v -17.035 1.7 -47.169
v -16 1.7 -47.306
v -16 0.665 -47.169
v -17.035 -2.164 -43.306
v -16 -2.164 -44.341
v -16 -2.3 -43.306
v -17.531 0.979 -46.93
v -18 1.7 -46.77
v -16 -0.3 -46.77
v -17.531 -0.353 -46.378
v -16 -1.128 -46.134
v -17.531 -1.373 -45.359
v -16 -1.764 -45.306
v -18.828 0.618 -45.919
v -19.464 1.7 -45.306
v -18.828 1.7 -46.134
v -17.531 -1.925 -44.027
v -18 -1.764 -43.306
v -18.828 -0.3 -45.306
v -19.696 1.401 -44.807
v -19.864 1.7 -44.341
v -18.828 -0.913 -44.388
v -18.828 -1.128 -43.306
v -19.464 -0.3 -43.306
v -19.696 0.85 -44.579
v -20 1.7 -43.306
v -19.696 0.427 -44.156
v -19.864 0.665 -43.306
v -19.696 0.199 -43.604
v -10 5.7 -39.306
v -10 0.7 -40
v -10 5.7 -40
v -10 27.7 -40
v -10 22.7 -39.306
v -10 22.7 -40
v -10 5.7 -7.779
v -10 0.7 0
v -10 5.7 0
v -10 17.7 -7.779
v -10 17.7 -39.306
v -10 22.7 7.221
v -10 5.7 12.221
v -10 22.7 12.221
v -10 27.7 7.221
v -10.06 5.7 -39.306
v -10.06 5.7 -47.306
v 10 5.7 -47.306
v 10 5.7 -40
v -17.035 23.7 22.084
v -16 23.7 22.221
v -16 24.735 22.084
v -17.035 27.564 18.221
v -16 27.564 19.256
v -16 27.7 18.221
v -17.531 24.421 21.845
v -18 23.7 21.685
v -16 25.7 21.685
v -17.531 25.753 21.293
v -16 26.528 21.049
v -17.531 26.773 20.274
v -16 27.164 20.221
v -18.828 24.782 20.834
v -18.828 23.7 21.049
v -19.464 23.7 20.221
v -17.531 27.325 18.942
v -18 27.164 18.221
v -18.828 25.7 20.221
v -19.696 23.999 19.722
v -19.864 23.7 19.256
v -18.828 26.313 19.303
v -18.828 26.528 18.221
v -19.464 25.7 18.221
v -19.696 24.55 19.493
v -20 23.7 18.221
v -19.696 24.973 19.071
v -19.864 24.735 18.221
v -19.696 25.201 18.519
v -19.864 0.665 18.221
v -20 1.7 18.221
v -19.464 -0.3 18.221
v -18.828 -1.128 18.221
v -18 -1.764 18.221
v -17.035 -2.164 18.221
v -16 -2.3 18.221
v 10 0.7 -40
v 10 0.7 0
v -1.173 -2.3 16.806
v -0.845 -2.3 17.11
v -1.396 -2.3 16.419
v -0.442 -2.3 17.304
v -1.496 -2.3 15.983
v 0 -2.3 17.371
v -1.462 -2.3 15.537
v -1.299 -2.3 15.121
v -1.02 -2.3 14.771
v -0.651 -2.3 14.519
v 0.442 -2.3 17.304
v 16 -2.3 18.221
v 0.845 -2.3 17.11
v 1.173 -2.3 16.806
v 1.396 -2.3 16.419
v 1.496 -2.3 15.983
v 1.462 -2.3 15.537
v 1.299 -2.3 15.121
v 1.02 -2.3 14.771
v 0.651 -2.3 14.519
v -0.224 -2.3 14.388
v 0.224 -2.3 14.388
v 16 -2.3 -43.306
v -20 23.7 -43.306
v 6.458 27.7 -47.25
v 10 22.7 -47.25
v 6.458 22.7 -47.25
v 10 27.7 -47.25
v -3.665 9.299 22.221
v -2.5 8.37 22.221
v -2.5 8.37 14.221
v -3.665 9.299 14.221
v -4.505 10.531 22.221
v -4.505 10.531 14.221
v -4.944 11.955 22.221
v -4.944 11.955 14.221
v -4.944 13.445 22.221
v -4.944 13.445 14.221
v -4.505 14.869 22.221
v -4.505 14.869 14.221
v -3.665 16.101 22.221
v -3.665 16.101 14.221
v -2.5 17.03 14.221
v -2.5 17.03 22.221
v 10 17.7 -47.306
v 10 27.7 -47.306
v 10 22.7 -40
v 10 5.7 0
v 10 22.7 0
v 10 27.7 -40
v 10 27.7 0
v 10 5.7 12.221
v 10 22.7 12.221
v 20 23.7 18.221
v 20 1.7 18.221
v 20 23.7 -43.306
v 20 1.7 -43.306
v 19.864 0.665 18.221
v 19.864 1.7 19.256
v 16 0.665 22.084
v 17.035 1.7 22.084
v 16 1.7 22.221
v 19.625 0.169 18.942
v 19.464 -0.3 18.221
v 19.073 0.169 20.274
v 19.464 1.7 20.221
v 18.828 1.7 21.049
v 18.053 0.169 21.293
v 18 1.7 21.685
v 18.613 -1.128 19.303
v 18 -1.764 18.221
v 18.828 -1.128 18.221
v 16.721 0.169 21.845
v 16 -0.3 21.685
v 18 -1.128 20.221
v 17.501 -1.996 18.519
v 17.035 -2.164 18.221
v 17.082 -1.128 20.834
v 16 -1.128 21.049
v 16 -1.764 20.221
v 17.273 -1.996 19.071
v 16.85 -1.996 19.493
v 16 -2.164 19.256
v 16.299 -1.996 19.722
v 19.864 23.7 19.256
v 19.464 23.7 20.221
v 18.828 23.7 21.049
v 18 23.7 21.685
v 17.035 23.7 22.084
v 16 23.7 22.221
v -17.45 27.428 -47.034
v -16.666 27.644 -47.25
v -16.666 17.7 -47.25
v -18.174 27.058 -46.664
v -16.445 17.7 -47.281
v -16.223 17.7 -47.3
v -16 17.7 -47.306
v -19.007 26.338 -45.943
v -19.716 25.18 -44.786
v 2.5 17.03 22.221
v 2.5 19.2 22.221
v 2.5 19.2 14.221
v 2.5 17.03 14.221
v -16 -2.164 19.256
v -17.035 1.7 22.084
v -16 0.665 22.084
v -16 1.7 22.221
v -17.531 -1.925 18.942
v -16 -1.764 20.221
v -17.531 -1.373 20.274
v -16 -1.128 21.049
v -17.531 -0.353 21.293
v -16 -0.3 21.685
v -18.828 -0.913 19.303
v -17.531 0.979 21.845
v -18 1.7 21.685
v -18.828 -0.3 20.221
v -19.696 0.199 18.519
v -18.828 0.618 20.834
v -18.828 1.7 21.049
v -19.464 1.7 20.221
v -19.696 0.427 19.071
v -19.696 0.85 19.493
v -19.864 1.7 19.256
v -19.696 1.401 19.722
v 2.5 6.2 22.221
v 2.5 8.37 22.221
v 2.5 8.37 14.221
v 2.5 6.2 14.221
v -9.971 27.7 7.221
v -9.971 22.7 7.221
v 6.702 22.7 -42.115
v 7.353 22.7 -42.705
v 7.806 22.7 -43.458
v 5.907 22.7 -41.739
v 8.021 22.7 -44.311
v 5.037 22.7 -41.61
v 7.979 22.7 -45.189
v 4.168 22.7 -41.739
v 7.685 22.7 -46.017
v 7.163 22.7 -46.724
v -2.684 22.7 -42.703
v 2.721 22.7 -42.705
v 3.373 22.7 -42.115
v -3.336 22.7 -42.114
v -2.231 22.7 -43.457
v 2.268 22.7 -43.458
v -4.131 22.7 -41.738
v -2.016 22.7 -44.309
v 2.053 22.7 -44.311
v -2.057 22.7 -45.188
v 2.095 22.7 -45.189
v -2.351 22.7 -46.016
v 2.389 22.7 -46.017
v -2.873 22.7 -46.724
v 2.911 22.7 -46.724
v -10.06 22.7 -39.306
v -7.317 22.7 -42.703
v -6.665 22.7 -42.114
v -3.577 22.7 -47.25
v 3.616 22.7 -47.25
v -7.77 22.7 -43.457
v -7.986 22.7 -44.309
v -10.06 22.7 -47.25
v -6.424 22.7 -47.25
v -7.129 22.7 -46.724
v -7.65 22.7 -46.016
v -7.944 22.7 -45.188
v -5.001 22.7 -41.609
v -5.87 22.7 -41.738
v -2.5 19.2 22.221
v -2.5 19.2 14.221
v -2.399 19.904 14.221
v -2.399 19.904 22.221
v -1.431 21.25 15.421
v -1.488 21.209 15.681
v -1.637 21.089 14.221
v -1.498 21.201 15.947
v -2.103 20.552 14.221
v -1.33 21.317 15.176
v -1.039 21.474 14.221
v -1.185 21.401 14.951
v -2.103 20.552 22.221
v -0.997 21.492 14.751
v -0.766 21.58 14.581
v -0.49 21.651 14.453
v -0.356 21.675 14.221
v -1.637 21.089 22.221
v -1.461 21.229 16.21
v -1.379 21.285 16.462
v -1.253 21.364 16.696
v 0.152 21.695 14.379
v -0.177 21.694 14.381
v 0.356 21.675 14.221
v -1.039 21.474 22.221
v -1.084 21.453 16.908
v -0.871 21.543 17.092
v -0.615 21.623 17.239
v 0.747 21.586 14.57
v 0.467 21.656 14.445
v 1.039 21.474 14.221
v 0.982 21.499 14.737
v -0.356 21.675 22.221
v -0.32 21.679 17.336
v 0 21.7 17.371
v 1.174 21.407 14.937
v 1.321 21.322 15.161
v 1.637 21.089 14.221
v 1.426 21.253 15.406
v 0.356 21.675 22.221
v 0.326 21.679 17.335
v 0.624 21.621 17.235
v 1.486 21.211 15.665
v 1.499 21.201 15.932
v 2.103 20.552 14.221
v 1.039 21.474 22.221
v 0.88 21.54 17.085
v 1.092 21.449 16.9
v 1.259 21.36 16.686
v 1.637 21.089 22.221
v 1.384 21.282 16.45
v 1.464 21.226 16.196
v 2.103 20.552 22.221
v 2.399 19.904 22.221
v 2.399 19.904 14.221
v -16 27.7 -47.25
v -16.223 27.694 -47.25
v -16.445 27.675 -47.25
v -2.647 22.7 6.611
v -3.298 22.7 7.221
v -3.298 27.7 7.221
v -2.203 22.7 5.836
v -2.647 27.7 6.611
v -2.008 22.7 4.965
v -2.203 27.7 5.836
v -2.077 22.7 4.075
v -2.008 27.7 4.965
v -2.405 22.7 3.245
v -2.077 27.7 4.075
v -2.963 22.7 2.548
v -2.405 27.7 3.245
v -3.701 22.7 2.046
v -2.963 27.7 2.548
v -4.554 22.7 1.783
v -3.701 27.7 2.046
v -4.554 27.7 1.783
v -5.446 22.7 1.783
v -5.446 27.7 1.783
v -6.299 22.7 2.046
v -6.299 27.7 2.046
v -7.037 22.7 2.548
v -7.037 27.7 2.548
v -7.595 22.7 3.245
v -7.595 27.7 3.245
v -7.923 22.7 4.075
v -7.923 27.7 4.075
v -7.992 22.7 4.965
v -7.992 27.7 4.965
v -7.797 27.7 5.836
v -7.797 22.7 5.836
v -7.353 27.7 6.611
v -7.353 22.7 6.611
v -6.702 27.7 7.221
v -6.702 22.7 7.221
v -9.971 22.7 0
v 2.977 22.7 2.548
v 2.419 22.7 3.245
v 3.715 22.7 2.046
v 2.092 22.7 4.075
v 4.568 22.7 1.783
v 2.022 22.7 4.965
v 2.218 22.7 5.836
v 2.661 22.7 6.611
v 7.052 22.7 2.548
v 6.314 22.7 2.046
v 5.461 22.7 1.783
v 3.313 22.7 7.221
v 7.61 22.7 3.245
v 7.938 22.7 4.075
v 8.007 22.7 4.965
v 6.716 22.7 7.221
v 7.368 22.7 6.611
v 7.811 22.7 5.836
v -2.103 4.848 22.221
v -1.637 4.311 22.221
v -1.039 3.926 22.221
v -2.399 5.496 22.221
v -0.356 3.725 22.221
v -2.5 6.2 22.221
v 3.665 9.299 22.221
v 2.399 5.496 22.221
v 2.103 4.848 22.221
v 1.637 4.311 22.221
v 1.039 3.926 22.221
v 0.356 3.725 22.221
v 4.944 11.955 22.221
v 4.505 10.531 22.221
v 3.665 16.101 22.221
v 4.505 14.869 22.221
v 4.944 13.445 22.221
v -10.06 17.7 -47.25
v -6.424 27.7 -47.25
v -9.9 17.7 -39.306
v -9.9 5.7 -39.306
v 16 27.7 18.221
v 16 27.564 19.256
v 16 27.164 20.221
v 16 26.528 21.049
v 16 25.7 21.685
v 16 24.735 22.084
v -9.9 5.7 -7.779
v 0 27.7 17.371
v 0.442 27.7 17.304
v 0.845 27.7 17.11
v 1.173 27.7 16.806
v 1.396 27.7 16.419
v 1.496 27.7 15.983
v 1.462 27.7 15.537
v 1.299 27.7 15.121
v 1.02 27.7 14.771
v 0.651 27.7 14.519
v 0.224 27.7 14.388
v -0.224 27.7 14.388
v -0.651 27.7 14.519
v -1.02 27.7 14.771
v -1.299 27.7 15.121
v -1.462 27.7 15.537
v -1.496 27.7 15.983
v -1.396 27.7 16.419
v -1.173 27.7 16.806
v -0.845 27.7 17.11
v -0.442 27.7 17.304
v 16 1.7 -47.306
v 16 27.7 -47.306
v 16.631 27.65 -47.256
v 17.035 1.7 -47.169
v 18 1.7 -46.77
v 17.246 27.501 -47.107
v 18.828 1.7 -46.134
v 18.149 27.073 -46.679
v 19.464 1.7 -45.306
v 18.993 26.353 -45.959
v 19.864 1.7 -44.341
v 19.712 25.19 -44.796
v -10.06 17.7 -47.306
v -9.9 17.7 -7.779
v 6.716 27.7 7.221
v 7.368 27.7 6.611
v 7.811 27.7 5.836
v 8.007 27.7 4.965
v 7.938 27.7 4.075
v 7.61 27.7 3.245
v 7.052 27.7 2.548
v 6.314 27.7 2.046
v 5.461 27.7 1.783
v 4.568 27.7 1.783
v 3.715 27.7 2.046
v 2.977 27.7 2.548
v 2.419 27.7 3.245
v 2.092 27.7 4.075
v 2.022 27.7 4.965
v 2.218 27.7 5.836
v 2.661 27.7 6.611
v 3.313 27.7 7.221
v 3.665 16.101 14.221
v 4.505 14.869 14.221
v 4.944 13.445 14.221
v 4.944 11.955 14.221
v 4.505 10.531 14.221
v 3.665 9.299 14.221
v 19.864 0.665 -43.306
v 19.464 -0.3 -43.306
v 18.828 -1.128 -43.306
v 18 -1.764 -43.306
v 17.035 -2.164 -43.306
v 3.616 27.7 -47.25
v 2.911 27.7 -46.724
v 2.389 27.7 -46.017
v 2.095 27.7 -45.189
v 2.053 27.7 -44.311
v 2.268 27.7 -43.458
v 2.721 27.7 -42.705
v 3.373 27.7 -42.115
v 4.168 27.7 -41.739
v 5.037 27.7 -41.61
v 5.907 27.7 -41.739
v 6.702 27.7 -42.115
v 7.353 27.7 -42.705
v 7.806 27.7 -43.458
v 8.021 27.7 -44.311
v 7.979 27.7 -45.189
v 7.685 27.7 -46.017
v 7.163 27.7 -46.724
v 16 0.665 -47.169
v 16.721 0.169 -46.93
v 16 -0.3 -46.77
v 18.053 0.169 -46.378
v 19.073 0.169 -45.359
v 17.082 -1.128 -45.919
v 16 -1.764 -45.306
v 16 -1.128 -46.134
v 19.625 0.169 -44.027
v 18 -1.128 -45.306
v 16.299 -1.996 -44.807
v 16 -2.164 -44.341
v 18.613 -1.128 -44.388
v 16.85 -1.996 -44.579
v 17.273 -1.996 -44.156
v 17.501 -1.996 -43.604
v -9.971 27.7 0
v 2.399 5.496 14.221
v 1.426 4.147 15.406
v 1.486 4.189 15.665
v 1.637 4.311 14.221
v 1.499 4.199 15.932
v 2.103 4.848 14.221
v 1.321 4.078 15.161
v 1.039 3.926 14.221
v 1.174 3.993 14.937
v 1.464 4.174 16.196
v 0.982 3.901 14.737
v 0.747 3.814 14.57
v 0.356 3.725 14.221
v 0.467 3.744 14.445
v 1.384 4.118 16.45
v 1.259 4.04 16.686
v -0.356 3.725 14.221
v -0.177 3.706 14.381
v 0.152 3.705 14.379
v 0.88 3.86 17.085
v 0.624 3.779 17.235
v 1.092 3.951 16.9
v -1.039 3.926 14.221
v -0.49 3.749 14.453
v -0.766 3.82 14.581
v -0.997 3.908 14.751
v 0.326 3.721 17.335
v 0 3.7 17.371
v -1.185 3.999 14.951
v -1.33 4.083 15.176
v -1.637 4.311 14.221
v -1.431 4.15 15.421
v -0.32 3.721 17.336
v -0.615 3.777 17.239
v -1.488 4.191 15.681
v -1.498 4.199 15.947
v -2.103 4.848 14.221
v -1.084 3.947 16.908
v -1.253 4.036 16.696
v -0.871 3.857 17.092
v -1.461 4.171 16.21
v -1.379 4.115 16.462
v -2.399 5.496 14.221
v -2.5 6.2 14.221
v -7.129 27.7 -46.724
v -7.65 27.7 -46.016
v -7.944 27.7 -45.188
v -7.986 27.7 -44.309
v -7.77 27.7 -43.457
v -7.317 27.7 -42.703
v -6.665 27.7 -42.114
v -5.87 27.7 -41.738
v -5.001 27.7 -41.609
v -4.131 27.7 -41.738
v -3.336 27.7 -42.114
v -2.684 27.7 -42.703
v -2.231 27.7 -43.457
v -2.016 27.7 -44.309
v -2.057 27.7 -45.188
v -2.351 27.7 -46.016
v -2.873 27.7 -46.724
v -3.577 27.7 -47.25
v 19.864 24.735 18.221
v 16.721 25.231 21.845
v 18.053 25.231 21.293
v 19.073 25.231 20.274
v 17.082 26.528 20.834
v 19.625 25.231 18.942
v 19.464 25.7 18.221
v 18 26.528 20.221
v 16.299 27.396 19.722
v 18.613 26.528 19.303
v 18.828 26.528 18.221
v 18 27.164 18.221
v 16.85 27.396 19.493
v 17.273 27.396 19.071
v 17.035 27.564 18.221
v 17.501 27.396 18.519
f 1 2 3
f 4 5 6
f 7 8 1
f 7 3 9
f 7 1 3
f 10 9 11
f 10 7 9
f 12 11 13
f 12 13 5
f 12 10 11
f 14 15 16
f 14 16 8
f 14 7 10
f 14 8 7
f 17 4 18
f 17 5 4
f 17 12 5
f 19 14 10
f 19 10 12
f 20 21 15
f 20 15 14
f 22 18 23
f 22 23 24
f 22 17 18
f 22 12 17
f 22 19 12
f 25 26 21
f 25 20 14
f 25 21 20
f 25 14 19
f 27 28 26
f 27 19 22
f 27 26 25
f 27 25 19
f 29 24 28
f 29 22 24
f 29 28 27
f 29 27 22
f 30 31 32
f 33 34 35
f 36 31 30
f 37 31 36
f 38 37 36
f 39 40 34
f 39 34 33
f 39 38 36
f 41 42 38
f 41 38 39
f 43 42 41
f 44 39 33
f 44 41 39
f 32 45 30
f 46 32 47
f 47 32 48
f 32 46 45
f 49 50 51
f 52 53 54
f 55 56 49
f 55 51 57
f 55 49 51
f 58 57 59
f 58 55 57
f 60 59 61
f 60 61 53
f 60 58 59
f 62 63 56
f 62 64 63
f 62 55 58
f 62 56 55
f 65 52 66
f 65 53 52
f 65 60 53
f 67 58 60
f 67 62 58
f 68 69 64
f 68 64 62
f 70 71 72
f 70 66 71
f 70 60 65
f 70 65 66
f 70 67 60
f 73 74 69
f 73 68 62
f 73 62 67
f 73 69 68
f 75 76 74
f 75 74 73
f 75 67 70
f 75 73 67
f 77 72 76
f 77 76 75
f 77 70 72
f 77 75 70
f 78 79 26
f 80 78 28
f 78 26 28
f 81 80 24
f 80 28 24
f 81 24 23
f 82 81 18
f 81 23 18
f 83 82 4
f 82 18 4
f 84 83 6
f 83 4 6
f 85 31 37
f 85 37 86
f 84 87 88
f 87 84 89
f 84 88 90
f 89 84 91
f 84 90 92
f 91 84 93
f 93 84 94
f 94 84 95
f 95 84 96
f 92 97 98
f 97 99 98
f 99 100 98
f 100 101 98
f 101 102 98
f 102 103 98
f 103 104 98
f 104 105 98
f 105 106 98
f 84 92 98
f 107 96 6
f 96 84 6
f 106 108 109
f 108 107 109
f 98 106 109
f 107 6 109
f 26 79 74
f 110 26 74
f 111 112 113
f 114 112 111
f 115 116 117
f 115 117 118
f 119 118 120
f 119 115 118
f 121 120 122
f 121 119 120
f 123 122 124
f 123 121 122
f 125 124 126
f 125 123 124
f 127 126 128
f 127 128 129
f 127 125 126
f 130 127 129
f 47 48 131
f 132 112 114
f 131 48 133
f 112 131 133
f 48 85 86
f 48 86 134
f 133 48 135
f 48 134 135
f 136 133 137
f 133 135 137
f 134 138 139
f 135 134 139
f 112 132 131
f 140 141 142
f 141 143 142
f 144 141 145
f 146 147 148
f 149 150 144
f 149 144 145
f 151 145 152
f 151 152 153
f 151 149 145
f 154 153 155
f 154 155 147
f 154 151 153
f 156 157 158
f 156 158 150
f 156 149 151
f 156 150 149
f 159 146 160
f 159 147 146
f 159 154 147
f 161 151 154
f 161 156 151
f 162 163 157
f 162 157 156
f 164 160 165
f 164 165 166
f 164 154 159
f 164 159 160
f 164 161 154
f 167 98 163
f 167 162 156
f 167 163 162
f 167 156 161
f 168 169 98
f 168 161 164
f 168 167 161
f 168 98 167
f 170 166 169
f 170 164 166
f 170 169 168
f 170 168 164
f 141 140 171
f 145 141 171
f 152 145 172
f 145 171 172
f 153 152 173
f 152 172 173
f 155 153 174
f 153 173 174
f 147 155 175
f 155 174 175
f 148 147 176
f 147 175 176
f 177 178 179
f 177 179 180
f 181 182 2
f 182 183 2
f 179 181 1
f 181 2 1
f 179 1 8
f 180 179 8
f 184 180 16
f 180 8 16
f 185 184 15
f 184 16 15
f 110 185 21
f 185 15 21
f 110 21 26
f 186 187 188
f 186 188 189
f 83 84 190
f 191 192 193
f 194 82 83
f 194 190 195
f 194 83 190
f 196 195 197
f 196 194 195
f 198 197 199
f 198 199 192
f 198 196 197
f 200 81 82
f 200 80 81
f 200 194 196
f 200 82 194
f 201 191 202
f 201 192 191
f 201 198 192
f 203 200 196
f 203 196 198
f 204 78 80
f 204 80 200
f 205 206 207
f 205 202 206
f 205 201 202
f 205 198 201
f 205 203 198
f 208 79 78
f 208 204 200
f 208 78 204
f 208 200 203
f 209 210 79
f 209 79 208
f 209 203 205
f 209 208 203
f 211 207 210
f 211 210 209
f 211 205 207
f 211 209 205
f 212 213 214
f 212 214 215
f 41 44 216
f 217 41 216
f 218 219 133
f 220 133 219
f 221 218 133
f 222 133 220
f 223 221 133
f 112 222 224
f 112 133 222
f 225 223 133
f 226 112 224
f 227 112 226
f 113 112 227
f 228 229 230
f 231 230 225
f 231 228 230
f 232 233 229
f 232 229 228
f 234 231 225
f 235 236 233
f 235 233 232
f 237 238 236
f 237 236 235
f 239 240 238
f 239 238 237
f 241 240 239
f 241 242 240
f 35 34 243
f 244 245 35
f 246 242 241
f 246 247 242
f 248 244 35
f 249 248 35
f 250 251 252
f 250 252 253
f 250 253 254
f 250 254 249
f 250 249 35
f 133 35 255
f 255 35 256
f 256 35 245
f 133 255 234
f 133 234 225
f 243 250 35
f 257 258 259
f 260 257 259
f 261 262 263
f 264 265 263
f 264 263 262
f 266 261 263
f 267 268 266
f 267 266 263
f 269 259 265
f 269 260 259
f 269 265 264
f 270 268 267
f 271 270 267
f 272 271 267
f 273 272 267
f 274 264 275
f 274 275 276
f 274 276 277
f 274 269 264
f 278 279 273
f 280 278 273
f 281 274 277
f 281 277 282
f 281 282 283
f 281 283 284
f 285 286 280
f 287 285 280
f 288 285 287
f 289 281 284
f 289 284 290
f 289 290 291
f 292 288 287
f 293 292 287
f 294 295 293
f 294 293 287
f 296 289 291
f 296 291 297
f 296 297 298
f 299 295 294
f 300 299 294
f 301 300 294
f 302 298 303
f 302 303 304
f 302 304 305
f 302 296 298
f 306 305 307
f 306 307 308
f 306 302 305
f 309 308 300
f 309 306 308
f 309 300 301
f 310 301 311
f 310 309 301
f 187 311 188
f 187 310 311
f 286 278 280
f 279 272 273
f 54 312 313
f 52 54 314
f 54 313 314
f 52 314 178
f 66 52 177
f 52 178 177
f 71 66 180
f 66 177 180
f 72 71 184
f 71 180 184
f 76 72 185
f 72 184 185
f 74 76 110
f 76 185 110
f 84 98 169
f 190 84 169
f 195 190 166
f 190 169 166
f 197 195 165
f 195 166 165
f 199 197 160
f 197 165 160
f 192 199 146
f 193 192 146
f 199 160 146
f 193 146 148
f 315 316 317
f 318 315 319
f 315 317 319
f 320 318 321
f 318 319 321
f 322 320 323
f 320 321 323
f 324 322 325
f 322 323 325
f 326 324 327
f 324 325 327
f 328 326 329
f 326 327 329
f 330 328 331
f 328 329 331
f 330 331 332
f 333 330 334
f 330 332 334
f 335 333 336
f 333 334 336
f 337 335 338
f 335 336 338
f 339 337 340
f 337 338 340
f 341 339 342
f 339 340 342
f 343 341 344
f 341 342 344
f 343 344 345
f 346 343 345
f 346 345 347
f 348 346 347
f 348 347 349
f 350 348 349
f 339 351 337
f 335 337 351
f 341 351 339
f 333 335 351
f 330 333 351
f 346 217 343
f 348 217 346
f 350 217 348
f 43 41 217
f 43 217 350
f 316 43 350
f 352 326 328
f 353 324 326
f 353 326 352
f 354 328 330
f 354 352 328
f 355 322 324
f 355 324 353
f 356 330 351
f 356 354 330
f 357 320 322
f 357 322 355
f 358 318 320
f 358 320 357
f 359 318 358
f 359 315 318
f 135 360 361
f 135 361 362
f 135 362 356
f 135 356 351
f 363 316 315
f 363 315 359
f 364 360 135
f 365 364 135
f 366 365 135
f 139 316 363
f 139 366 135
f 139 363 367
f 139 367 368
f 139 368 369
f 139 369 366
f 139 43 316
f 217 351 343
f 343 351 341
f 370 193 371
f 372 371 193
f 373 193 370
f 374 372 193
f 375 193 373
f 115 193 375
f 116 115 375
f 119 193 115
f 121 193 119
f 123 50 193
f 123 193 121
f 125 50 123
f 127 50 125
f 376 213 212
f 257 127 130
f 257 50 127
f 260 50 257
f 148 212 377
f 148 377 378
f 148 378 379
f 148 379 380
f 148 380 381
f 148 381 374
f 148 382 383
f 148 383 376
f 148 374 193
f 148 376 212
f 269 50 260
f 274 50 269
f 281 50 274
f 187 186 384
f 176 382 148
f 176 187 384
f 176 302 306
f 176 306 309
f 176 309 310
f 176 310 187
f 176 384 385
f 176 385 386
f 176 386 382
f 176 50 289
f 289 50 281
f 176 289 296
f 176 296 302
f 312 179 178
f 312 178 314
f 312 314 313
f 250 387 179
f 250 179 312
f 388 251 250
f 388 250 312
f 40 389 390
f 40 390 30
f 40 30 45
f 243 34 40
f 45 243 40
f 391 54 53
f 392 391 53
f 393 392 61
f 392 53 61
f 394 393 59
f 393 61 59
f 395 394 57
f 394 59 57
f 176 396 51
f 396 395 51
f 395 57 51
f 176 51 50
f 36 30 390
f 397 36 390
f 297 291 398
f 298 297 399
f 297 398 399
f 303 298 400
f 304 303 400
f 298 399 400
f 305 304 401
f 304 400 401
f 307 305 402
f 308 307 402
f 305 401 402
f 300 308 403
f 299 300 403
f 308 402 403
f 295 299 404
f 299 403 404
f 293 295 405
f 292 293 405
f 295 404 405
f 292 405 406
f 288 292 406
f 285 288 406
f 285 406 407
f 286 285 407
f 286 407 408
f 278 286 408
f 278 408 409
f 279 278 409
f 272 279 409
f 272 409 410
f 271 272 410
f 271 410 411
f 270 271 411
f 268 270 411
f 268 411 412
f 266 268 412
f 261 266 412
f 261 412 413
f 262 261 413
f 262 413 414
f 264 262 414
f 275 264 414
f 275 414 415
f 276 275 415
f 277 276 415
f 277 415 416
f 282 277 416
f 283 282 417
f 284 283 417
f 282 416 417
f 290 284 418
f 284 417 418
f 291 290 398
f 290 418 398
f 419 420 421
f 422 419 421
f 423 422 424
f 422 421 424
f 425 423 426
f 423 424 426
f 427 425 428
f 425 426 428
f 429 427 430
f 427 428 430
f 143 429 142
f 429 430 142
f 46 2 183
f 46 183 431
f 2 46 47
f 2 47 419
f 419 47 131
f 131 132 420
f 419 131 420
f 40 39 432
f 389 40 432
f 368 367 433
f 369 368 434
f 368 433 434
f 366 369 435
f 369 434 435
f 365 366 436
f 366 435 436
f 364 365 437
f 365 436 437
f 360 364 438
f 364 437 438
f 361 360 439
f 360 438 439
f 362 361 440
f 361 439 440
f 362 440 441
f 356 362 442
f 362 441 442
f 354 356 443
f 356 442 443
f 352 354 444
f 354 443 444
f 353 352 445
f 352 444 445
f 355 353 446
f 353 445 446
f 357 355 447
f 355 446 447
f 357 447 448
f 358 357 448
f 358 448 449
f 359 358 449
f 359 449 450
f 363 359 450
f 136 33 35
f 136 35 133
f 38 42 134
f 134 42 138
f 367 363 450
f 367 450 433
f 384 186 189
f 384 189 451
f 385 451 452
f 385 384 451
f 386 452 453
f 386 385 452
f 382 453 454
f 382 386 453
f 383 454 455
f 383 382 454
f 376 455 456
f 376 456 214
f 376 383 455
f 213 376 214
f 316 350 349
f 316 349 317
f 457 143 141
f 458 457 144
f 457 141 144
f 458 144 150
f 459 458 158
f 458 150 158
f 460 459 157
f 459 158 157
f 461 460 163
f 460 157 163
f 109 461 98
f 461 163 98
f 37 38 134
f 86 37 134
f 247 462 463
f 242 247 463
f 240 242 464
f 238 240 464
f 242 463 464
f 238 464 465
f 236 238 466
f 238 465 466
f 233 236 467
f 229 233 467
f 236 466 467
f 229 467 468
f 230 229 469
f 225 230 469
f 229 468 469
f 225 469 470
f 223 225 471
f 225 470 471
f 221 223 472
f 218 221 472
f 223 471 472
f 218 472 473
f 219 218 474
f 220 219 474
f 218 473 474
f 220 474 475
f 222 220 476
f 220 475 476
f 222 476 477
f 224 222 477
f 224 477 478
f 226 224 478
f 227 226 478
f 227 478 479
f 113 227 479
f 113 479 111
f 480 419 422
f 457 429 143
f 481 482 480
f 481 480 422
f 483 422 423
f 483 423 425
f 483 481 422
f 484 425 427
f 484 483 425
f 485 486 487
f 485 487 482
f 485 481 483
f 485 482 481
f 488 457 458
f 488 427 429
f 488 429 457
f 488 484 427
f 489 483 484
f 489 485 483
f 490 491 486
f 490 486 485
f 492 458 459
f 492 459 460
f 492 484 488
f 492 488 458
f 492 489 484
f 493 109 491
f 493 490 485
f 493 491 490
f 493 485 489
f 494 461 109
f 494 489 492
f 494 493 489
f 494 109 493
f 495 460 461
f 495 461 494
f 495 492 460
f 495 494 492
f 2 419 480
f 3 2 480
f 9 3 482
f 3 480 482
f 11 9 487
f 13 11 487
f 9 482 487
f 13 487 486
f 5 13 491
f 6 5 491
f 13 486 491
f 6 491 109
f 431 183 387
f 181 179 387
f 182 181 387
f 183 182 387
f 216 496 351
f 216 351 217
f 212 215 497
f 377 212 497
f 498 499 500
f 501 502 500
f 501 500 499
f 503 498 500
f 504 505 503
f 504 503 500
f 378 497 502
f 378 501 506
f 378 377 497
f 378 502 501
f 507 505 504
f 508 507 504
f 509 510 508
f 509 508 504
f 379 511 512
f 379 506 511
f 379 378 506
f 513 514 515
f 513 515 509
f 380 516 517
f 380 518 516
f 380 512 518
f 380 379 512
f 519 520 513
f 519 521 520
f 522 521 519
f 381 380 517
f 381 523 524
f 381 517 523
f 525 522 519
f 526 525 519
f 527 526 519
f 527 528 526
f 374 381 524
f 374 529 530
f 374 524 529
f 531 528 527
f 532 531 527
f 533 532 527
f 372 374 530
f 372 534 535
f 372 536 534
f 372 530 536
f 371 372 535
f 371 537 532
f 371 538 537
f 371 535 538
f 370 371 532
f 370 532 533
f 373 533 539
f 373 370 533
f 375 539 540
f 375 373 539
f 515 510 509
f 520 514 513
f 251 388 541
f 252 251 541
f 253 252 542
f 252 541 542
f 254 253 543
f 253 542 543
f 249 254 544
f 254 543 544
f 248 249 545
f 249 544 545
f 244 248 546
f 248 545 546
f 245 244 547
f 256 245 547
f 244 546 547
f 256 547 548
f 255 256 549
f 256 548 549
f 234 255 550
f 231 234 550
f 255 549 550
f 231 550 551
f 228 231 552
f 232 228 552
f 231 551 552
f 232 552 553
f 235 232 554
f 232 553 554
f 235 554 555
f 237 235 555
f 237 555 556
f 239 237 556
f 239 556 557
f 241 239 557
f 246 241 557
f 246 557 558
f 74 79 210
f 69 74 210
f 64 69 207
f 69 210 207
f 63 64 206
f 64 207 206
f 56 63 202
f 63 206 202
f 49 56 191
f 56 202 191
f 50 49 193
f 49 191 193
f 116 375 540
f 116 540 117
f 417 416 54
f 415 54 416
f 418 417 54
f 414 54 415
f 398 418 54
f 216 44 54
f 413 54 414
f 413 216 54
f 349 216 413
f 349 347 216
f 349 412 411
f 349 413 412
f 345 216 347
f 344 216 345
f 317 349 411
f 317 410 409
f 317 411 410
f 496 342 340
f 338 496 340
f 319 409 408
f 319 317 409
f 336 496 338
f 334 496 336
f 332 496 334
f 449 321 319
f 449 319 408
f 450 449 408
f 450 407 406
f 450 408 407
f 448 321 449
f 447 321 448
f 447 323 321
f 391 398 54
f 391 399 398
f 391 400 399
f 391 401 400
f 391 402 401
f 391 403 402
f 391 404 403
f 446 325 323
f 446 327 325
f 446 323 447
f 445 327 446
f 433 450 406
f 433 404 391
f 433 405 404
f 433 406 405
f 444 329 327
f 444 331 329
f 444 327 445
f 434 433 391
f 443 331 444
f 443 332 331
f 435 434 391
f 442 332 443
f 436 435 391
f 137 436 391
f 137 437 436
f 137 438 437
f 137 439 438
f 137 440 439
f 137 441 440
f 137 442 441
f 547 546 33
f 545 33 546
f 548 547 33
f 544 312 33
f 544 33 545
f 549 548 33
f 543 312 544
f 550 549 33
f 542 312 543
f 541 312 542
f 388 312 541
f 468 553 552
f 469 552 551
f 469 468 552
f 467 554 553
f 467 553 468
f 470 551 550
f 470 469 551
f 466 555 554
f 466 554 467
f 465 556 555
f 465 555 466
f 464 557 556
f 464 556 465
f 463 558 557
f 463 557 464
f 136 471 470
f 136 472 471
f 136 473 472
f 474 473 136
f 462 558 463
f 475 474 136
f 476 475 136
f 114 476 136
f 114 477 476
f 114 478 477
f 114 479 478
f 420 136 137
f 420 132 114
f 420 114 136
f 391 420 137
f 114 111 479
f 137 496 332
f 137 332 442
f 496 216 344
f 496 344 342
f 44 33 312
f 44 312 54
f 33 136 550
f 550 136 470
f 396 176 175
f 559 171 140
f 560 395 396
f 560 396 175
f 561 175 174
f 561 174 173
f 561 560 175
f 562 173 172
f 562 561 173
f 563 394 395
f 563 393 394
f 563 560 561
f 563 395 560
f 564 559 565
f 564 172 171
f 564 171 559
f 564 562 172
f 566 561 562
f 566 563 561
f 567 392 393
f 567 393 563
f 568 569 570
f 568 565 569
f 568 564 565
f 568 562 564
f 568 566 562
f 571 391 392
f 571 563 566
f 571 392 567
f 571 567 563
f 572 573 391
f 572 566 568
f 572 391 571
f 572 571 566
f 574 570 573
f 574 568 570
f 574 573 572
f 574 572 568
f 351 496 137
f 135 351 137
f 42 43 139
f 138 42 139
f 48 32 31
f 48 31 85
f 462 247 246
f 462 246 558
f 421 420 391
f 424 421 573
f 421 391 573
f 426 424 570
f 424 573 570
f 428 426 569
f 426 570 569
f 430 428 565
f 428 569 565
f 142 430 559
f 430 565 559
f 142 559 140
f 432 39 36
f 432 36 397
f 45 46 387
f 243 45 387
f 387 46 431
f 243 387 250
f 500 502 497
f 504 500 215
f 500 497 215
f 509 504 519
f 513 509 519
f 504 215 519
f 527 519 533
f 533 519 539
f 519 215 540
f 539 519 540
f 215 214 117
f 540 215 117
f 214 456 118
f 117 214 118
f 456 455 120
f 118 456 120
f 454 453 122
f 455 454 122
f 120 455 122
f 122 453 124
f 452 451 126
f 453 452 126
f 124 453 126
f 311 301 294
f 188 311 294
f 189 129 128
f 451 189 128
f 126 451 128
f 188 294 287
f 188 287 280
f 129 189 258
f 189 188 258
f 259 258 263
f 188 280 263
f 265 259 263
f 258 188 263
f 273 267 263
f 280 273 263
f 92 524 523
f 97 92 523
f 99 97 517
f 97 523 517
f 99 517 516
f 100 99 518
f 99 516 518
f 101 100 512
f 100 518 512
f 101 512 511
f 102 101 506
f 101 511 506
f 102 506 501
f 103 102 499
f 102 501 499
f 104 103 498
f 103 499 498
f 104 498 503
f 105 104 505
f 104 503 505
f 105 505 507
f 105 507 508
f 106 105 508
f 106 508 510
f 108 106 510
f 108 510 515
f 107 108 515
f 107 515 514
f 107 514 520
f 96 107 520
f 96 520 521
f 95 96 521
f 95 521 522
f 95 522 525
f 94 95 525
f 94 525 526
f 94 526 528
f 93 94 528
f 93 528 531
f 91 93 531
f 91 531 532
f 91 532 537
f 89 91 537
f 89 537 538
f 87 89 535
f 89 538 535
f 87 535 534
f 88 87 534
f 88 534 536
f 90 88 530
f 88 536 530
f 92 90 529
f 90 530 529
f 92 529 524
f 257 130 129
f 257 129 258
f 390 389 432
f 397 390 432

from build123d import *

# Parameters (mm, degrees)
SKETCH3_W            = 19.970710678
SKETCH3_H            = 7.220710678
BOSS_EXTRUDE2_DEPTH  = 10
SKETCH4_W            = 54.526496071
SKETCH4_H            = 10
BOSS_EXTRUDE3_DEPTH  = 10
SKETCH5_W            = 7.25
SKETCH5_H            = 10.1
BOSS_EXTRUDE4_DEPTH  = 20
SKETCH6_W            = 54.470710678
SKETCH6_H            = 10
BOSS_EXTRUDE5_DEPTH  = 10
SKETCH7_R            = 3
SKETCH7_R_2          = 2.998828916
CUT_EXTRUDE1_DEPTH   = 12
SKETCH8_R            = 3
CUT_EXTRUDE2_DEPTH   = 12
SKETCH9_W            = 40
SKETCH9_H            = 54.526496071
SKETCH9_W_2          = 19.9
SKETCH9_H_2          = 40
BOSS_EXTRUDE8_DEPTH  = 12
SKETCH10_W           = 20.059980773
SKETCH10_H           = 17
CUT_EXTRUDE6_DEPTH   = 8
SKETCH11_W           = 40
SKETCH11_H           = 22
BOSS_EXTRUDE9_DEPTH  = 5
SKETCH12_W           = 7.25
SKETCH12_H           = 0.1
CUT_EXTRUDE7_DEPTH   = 20
SKETCH13_W           = 20
SKETCH13_H           = 17
CUT_EXTRUDE8_DEPTH   = 20
SKETCH16_W           = 40
SKETCH16_H           = 59.526496071
BOSS_EXTRUDE11_DEPTH = 8
SKETCH17_W           = 20
SKETCH17_H           = 40
CUT_EXTRUDE10_DEPTH  = 5
SKETCH19_W           = 40
SKETCH19_H           = 30
BOSS_EXTRUDE12_DEPTH = 10
CUT_EXTRUDE11_DEPTH  = 8
SKETCH21_R           = 1.5
CUT_EXTRUDE12_DEPTH  = 30
FILLET2_R            = 4


with BuildPart() as part:
    # Sketch3 → Boss-Extrude2 (new body)
    with BuildSketch(Plane.XZ.offset(-27.7)):
        with Locations((0.014644661, 3.610355339)):
            Rectangle(SKETCH3_W, SKETCH3_H)
    extrude(amount=BOSS_EXTRUDE2_DEPTH)

    # Sketch4 → Boss-Extrude3 (add)
    with BuildSketch(Plane(origin=(10, 0, 0), x_dir=(0, 0, -1), z_dir=(1, 0, 0))):
        with Locations((20.042537357, 22.7)):
            Rectangle(SKETCH4_W, SKETCH4_H)
    extrude(amount=BOSS_EXTRUDE3_DEPTH)

    # Sketch5 → Boss-Extrude4 (add)
    with BuildSketch(Plane.ZY.offset(-10)):
        with Locations((-43.625, 22.75)):
            Rectangle(SKETCH5_W, SKETCH5_H)
    extrude(amount=BOSS_EXTRUDE4_DEPTH)

    # Sketch6 → Boss-Extrude5 (add)
    with BuildSketch(Plane.ZY.offset(10)):
        with Locations((-20.014644661, 22.7)):
            Rectangle(SKETCH6_W, SKETCH6_H)
    extrude(amount=BOSS_EXTRUDE5_DEPTH)

    # Sketch7 → Cut-Extrude1 (cut)
    with BuildSketch(Plane(origin=(0, 27.8, 0), x_dir=(1, 0, 0), z_dir=(0, 1, 0))):
        with Locations((-5.000552171, 44.609234731)):
            Circle(SKETCH7_R)
        with Locations((5.037134364, 44.609234731)):
            Circle(SKETCH7_R_2)
    extrude(amount=-CUT_EXTRUDE1_DEPTH, mode=Mode.SUBTRACT)

    # Sketch8 → Cut-Extrude2 (cut)
    with BuildSketch(Plane(origin=(0, 27.7, 0), x_dir=(1, 0, 0), z_dir=(0, 1, 0))):
        with Locations((-5, -4.75)):
            Circle(SKETCH8_R)
        with Locations((5.014644661, -4.75)):
            Circle(SKETCH8_R)
    extrude(amount=-CUT_EXTRUDE2_DEPTH, mode=Mode.SUBTRACT)

    # Sketch9 → Boss-Extrude8 (add)
    with BuildSketch(Plane.XZ.offset(-17.7)):
        with Locations((0, -20.042537357)):
            Rectangle(SKETCH9_W, SKETCH9_H)
        with Locations((0.05, -20)):
            Rectangle(SKETCH9_W_2, SKETCH9_H_2, mode=Mode.SUBTRACT)
    extrude(amount=BOSS_EXTRUDE8_DEPTH)

    # Sketch10 → Cut-Extrude6 (cut)
    with BuildSketch(Plane(origin=(0, 0, -47.305785393), x_dir=(-1, 0, 0), z_dir=(0, 0, -1))):
        with Locations((0.029990387, 14.2)):
            Rectangle(SKETCH10_W, SKETCH10_H)
    extrude(amount=-CUT_EXTRUDE6_DEPTH, mode=Mode.SUBTRACT)

    # Sketch11 → Boss-Extrude9 (add)
    with BuildSketch(Plane.XY.offset(7.220710678)):
        with Locations((0, 16.7)):
            Rectangle(SKETCH11_W, SKETCH11_H)
    extrude(amount=BOSS_EXTRUDE9_DEPTH)

    # Sketch12 → Cut-Extrude7 (cut)
    with BuildSketch(Plane(origin=(10, 0, 0), x_dir=(0, 0, -1), z_dir=(1, 0, 0))):
        with Locations((43.625, 27.75)):
            Rectangle(SKETCH12_W, SKETCH12_H)
    extrude(amount=-CUT_EXTRUDE7_DEPTH, mode=Mode.SUBTRACT)

    # Sketch13 → Cut-Extrude8 (cut)
    with BuildSketch(Plane.XY.offset(12.220710678)):
        with Locations((0, 14.2)):
            Rectangle(SKETCH13_W, SKETCH13_H)
    extrude(amount=-CUT_EXTRUDE8_DEPTH, mode=Mode.SUBTRACT)

    # Sketch16 → Boss-Extrude11 (add)
    with BuildSketch(Plane.XZ.offset(-5.7)):
        with Locations((0, -17.542537357)):
            Rectangle(SKETCH16_W, SKETCH16_H)
    extrude(amount=BOSS_EXTRUDE11_DEPTH)

    # Sketch17 → Cut-Extrude10 (cut)
    with BuildSketch(Plane(origin=(0, 5.7, 0), x_dir=(1, 0, 0), z_dir=(0, 1, 0))):
        with Locations((0, 20)):
            Rectangle(SKETCH17_W, SKETCH17_H)
    extrude(amount=-CUT_EXTRUDE10_DEPTH, mode=Mode.SUBTRACT)

    # Sketch19 → Boss-Extrude12 (add)
    with BuildSketch(Plane.XY.offset(12.220710678)):
        with Locations((0, 12.7)):
            Rectangle(SKETCH19_W, SKETCH19_H)
    extrude(amount=BOSS_EXTRUDE12_DEPTH)

    # Sketch20 → Cut-Extrude11 (cut)
    with BuildSketch(Plane.XY.offset(22.220710678)):
        with BuildLine():
            Line((-2.5, 6.2), (-2.5, 8.369872981))
            ThreePointArc((-2.5, 8.369872981), (-5, 12.7), (-2.5, 17.030127019))
            Line((-2.5, 17.030127019), (-2.5, 19.2))
            ThreePointArc((-2.5, 19.2), (0, 21.7), (2.5, 19.2))
            Line((2.5, 19.2), (2.5, 17.030127019))
            ThreePointArc((2.5, 17.030127019), (5, 12.7), (2.5, 8.369872981))
            Line((2.5, 8.369872981), (2.5, 6.2))
            ThreePointArc((2.5, 6.2), (0, 3.7), (-2.5, 6.2))
        make_face()
    extrude(amount=-CUT_EXTRUDE11_DEPTH, mode=Mode.SUBTRACT)

    # Sketch21 → Cut-Extrude12 (cut)
    with BuildSketch(Plane(origin=(0, 27.7, 0), x_dir=(1, 0, 0), z_dir=(0, 1, 0))):
        with Locations(Location((0, -15.870882648, 0), (0, 0, 270))):
            Circle(SKETCH21_R)
    extrude(amount=-CUT_EXTRUDE12_DEPTH, mode=Mode.SUBTRACT)

    # Fillet2
    # the kernel refuses this fillet: 4 mm, written as the material it takes off along each edge
    with BuildSketch(Plane(origin=(16, 23.7, 18.220710678), x_dir=(1, 0, 0), z_dir=(0, 1, 0))) as fillet2_piece_1_section:
        Polygon((0, 0), (FILLET2_R, 0), (FILLET2_R, -FILLET2_R), (0, -FILLET2_R), align=None)
    fillet2_piece_1 = extrude(amount=FILLET2_R, mode=Mode.PRIVATE)
    fillet2_piece_1 = fillet2_piece_1 - Plane(origin=(16, 23.7, 18.220710678), x_dir=(-0.7071067811865475, 0, -0.7071067811865475), z_dir=(0, 1, 0)) * Sphere(FILLET2_R, mode=Mode.PRIVATE)
    add(fillet2_piece_1, mode=Mode.SUBTRACT)
    with BuildSketch(Plane(origin=(-16, 23.7, 18.220710678), x_dir=(0, 1, 0), z_dir=(-1, 0, 0))) as fillet2_piece_2_section:
        Polygon((0, 0), (FILLET2_R, 0), (FILLET2_R, -FILLET2_R), (0, -FILLET2_R), align=None)
    fillet2_piece_2 = extrude(amount=FILLET2_R, mode=Mode.PRIVATE)
    fillet2_piece_2 = fillet2_piece_2 - Plane(origin=(-16, 23.7, 18.220710678), x_dir=(0, -0.7071067811865475, -0.7071067811865475), z_dir=(-1, 0, 0)) * Sphere(FILLET2_R, mode=Mode.PRIVATE)
    add(fillet2_piece_2, mode=Mode.SUBTRACT)
    with BuildSketch(Plane(origin=(-16, 1.7, -43.305785393), x_dir=(0, 0, -1), z_dir=(-1, 0, 0))) as fillet2_piece_3_section:
        Polygon((0, 0), (FILLET2_R, 0), (FILLET2_R, FILLET2_R), (0, FILLET2_R), align=None)
    fillet2_piece_3 = extrude(amount=FILLET2_R, mode=Mode.PRIVATE)
    fillet2_piece_3 = fillet2_piece_3 - Plane(origin=(-16, 1.7, -43.305785393), x_dir=(0, 0.7071067811865475, 0.7071067811865475), z_dir=(-1, 0, 0)) * Sphere(FILLET2_R, mode=Mode.PRIVATE)
    add(fillet2_piece_3, mode=Mode.SUBTRACT)
    with BuildSketch(Plane(origin=(-16, 1.7, 18.220710678), x_dir=(0, 0, 1), z_dir=(-1, 0, 0))) as fillet2_piece_4_section:
        Polygon((0, 0), (FILLET2_R, 0), (FILLET2_R, -FILLET2_R), (0, -FILLET2_R), align=None)
    fillet2_piece_4 = extrude(amount=FILLET2_R, mode=Mode.PRIVATE)
    fillet2_piece_4 = fillet2_piece_4 - Plane(origin=(-16, 1.7, 18.220710678), x_dir=(0, 0.7071067811865475, -0.7071067811865475), z_dir=(-1, 0, 0)) * Sphere(FILLET2_R, mode=Mode.PRIVATE)
    add(fillet2_piece_4, mode=Mode.SUBTRACT)
    with BuildSketch(Plane(origin=(16, 1.7, 18.220710678), x_dir=(1, 0, 0), z_dir=(0, -1, 0))) as fillet2_piece_5_section:
        Polygon((0, 0), (FILLET2_R, 0), (FILLET2_R, FILLET2_R), (0, FILLET2_R), align=None)
    fillet2_piece_5 = extrude(amount=FILLET2_R, mode=Mode.PRIVATE)
    fillet2_piece_5 = fillet2_piece_5 - Plane(origin=(16, 1.7, 18.220710678), x_dir=(-0.7071067811865475, 0, -0.7071067811865475), z_dir=(0, -1, 0)) * Sphere(FILLET2_R, mode=Mode.PRIVATE)
    add(fillet2_piece_5, mode=Mode.SUBTRACT)
    with BuildSketch(Plane(origin=(16, 1.7, -43.305785393), x_dir=(0, 0, -1), z_dir=(0, -1, 0))) as fillet2_piece_6_section:
        Polygon((0, 0), (FILLET2_R, 0), (FILLET2_R, FILLET2_R), (0, FILLET2_R), align=None)
    fillet2_piece_6 = extrude(amount=FILLET2_R, mode=Mode.PRIVATE)
    fillet2_piece_6 = fillet2_piece_6 - Plane(origin=(16, 1.7, -43.305785393), x_dir=(-0.7071067811865475, 0, 0.7071067811865475), z_dir=(0, -1, 0)) * Sphere(FILLET2_R, mode=Mode.PRIVATE)
    add(fillet2_piece_6, mode=Mode.SUBTRACT)
    with BuildSketch(Plane(origin=(20, 27.7, 18.220710678), x_dir=(-1, 0, 0), z_dir=(0, 0, -1))) as fillet2_piece_7:
        with BuildLine():
            CenterArc((FILLET2_R, -FILLET2_R), FILLET2_R, 90, 90)
            Line((0, -FILLET2_R), (0, 0))
            Line((0, 0), (FILLET2_R, 0))
        make_face()
    extrude(amount=75.526496071, mode=Mode.SUBTRACT)
    with BuildSketch(Plane(origin=(-20, 27.7, -57.25), x_dir=(1, 0, 0), z_dir=(0, 0, 1))) as fillet2_piece_8:
        with BuildLine():
            CenterArc((FILLET2_R, -FILLET2_R), FILLET2_R, 90, 90)
            Line((0, -FILLET2_R), (0, 0))
            Line((0, 0), (FILLET2_R, 0))
        make_face()
    extrude(amount=75.470710678, mode=Mode.SUBTRACT)
    with BuildSketch(Plane(origin=(-20, -2.3, -43.305785393), x_dir=(0, 1, 0), z_dir=(0, 0, 1)), Plane(origin=(20, -2.3, 18.220710678), x_dir=(0, 1, 0), z_dir=(0, 0, -1))) as fillet2_piece_9:
        with BuildLine():
            CenterArc((FILLET2_R, -FILLET2_R), FILLET2_R, 90, 90)
            Line((0, -FILLET2_R), (0, 0))
            Line((0, 0), (FILLET2_R, 0))
        make_face()
    extrude(amount=61.526496071, mode=Mode.SUBTRACT)
    with BuildSketch(Plane(origin=(16, -2.3, -47.305785393), x_dir=(0, 1, 0), z_dir=(-1, 0, 0)), Plane(origin=(-16, 27.7, 22.220710678), x_dir=(0, 0, -1), z_dir=(1, 0, 0))) as fillet2_piece_10:
        with BuildLine():
            CenterArc((FILLET2_R, -FILLET2_R), FILLET2_R, 90, 90)
            Line((0, -FILLET2_R), (0, 0))
            Line((0, 0), (FILLET2_R, 0))
        make_face()
    extrude(amount=32, mode=Mode.SUBTRACT)
    with BuildSketch(Plane(origin=(16, -2.3, 22.220710678), x_dir=(0, 1, 0), z_dir=(-1, 0, 0))) as fillet2_piece_11:
        with BuildLine():
            CenterArc((FILLET2_R, FILLET2_R), FILLET2_R, 180, 90)
            Line((0, FILLET2_R), (0, 0))
            Line((0, 0), (FILLET2_R, 0))
        make_face()
    extrude(amount=32, mode=Mode.SUBTRACT)
    with BuildSketch(Plane(origin=(-20, 1.7, -47.305785393), x_dir=(1, 0, 0), z_dir=(0, 1, 0))) as fillet2_piece_12:
        with BuildLine():
            CenterArc((FILLET2_R, -FILLET2_R), FILLET2_R, 90, 90)
            Line((0, -FILLET2_R), (0, 0))
            Line((0, 0), (FILLET2_R, 0))
        make_face()
    extrude(amount=26, mode=Mode.SUBTRACT)
    with BuildSketch(Plane(origin=(20, 37.7, -47.305785393), x_dir=(-1, 0, 0), z_dir=(0, -1, 0))) as fillet2_piece_13:
        with BuildLine():
            CenterArc((FILLET2_R, -FILLET2_R), FILLET2_R, 90, 90)
            Line((0, -FILLET2_R), (0, 0))
            Line((0, 0), (FILLET2_R, 0))
        make_face()
    extrude(amount=36, mode=Mode.SUBTRACT)
    with BuildSketch(Plane(origin=(20, 23.7, 22.220710678), x_dir=(0, 0, -1), z_dir=(0, -1, 0))) as fillet2_piece_14:
        with BuildLine():
            CenterArc((FILLET2_R, -FILLET2_R), FILLET2_R, 90, 90)
            Line((0, -FILLET2_R), (0, 0))
            Line((0, 0), (FILLET2_R, 0))
        make_face()
    extrude(amount=22, mode=Mode.SUBTRACT)
    with BuildSketch(Plane(origin=(-20, 1.7, 22.220710678), x_dir=(1, 0, 0), z_dir=(0, 1, 0))) as fillet2_piece_15:
        with BuildLine():
            CenterArc((FILLET2_R, FILLET2_R), FILLET2_R, 180, 90)
            Line((0, FILLET2_R), (0, 0))
            Line((0, 0), (FILLET2_R, 0))
        make_face()
    extrude(amount=22, mode=Mode.SUBTRACT)


solid = part.part
